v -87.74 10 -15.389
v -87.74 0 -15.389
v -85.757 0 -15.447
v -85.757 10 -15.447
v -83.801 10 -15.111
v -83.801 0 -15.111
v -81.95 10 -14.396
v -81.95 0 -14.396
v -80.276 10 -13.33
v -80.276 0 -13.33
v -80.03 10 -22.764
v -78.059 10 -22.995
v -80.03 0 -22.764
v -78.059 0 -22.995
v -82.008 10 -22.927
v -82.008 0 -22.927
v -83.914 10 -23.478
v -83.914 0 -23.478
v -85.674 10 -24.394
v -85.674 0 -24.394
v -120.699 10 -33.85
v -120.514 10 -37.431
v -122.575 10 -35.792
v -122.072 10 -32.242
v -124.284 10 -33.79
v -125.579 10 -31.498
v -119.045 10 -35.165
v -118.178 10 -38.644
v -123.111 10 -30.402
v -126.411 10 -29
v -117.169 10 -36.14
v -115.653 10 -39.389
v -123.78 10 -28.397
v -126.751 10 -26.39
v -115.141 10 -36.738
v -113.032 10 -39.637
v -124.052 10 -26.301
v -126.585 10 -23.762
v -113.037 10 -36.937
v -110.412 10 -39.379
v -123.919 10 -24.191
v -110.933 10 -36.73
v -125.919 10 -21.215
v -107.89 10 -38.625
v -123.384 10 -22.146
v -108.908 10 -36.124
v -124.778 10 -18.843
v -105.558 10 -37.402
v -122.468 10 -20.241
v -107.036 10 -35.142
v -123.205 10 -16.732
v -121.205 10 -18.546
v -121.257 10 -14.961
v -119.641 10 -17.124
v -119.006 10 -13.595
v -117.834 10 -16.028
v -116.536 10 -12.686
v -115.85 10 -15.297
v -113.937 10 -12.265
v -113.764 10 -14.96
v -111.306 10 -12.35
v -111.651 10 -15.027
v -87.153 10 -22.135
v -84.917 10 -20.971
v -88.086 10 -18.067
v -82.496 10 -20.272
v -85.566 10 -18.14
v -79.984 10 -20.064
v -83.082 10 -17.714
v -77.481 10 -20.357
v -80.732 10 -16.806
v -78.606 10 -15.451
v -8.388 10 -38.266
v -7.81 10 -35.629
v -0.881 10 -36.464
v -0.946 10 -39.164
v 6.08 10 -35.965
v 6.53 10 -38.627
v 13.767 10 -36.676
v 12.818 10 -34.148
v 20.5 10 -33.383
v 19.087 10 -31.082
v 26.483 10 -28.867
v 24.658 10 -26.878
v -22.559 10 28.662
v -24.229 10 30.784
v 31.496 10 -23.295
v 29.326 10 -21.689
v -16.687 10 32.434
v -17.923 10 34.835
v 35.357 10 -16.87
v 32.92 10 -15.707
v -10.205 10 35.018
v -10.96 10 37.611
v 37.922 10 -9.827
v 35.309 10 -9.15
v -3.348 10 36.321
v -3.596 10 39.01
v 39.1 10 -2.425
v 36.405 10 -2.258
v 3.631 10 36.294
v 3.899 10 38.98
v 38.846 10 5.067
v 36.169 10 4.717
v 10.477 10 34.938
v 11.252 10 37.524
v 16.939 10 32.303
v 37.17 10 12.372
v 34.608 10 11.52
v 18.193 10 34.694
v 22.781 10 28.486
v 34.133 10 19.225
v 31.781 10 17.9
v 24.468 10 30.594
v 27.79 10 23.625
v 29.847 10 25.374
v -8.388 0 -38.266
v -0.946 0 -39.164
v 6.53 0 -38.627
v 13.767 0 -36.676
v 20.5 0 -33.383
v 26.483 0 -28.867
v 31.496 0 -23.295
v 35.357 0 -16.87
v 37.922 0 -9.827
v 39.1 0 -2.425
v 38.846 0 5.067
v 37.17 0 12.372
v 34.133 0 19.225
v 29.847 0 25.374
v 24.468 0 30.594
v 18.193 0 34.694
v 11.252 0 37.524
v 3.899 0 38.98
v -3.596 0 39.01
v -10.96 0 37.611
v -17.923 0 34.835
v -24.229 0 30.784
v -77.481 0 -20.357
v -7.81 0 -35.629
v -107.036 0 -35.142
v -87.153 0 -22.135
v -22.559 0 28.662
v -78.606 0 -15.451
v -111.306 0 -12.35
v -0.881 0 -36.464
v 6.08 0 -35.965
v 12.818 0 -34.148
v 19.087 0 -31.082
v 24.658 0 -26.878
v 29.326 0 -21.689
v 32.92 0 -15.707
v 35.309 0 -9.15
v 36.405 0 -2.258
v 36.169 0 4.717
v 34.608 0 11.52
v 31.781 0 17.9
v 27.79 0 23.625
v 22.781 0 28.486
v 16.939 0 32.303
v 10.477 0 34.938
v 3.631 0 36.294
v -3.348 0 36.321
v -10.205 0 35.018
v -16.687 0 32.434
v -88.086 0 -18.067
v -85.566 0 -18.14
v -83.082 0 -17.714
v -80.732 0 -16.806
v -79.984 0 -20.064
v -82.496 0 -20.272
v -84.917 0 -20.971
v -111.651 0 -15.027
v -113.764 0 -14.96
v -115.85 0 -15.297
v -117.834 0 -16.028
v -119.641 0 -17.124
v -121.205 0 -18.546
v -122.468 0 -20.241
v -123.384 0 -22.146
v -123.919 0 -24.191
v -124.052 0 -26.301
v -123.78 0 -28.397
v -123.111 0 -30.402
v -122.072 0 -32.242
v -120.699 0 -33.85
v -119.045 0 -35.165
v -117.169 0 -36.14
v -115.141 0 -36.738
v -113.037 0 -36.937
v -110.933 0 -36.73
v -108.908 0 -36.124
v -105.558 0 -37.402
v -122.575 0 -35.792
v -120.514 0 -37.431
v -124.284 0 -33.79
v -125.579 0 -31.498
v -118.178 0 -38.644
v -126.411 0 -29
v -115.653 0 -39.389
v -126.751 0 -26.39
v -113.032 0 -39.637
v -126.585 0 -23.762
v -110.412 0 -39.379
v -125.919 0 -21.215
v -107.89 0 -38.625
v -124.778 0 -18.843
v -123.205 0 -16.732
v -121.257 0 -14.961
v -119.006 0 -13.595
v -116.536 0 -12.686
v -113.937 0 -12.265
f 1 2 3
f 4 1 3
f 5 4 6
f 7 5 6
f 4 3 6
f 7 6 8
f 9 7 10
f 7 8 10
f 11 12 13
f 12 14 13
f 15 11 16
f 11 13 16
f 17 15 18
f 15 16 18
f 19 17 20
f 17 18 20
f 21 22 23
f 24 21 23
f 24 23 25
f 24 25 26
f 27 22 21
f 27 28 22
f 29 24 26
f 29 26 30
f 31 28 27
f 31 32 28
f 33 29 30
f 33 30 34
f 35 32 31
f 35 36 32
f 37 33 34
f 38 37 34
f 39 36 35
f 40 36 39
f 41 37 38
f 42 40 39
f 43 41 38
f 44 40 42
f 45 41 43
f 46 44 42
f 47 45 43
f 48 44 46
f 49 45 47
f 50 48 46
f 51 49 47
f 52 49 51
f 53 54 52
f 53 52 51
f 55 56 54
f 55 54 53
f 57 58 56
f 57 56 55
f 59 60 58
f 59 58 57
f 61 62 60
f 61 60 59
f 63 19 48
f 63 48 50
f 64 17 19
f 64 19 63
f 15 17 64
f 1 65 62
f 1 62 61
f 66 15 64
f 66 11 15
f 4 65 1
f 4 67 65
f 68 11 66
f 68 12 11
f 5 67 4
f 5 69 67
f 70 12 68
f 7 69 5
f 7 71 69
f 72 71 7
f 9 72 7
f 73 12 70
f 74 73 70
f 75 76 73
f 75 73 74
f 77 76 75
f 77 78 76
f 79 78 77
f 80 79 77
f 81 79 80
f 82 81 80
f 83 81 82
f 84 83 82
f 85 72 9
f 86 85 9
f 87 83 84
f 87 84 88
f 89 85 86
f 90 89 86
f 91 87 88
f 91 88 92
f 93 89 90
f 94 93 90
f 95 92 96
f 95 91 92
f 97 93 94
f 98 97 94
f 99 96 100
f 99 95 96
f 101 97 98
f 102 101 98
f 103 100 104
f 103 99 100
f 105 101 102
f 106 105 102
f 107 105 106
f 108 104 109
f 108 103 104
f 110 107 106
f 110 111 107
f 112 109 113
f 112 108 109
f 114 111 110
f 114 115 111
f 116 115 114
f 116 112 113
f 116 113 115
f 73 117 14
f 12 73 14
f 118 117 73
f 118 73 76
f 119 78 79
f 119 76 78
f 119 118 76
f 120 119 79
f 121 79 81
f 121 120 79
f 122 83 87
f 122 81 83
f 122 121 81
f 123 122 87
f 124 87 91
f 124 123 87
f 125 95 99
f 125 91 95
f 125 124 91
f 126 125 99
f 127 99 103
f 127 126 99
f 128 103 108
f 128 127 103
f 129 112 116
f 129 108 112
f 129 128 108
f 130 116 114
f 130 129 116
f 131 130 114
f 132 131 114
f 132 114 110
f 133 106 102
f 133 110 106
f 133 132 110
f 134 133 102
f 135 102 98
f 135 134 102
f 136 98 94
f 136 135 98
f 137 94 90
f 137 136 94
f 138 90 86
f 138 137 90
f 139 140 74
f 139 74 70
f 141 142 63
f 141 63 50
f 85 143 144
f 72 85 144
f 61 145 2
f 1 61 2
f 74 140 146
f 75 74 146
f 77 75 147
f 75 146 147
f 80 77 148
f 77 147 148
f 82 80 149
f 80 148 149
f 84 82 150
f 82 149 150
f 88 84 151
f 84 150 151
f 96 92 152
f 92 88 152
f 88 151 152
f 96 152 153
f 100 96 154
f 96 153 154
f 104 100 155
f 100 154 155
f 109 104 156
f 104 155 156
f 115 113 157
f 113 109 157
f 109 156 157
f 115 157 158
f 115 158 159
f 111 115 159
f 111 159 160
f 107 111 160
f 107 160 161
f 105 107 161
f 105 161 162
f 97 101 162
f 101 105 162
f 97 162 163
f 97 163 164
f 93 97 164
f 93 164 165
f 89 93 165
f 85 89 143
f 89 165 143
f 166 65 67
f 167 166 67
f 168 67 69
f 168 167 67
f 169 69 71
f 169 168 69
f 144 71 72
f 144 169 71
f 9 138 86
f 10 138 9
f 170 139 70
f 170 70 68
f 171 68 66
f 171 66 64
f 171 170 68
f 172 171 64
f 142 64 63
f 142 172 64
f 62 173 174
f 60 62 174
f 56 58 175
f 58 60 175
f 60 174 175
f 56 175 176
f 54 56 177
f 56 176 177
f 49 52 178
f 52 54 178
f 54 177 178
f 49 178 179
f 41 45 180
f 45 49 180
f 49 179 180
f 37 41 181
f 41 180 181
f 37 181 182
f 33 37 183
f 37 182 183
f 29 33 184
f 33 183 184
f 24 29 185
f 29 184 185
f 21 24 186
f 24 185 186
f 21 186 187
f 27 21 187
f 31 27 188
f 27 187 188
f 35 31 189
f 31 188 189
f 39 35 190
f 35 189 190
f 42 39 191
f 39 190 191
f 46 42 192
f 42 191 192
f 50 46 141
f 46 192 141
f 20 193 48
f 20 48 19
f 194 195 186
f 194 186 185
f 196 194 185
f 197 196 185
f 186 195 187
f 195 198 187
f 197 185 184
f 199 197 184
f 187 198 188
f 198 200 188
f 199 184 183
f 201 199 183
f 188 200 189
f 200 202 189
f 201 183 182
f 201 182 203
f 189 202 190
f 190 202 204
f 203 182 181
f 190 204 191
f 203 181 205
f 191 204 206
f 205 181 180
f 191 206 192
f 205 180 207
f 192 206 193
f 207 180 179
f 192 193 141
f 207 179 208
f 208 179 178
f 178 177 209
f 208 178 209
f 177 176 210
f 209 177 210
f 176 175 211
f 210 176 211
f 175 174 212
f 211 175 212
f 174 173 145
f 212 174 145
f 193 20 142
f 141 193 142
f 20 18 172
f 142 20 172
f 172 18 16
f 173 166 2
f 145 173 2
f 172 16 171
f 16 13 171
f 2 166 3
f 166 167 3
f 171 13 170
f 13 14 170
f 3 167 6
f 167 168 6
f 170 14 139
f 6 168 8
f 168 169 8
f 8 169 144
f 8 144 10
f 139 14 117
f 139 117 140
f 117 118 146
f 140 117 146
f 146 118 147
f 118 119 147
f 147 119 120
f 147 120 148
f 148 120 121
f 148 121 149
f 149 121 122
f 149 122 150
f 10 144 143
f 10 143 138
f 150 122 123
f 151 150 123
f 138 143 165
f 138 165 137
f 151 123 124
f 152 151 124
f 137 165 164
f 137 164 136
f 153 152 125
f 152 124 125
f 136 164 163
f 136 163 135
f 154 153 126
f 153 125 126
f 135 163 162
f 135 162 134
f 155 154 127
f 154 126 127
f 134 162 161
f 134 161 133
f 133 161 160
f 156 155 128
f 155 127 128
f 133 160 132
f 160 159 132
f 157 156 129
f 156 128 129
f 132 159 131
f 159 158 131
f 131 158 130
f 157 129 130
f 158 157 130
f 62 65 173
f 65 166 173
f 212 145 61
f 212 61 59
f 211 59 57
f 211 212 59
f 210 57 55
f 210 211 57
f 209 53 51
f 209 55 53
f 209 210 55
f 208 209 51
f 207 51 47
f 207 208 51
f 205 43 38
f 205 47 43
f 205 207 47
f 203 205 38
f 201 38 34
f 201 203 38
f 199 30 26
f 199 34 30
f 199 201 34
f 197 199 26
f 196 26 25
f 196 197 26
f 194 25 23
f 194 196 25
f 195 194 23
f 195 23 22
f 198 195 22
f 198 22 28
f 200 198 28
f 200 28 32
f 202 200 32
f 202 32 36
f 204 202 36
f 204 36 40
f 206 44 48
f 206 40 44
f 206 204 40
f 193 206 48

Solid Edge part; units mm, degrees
sketch "Sketch1" plane through (0, 0, 0) normal (0, -1, 0) x (1, 0, 0)
  arc A0 (-24.229, 30.7837) -> (-8.3881, -38.2664) centre (0, 0) cw
  line L0 (-8.3881, -38.2664) -> (-78.0589, -22.9945)
  arc A1 (-85.6745, -24.3941) -> (-78.0589, -22.9945) centre (-80.2, -32.7626) cw
  line L1 (-105.5582, -37.4017) -> (-85.6745, -24.3941)
  arc A2 (-105.5582, -37.4017) -> (-111.3055, -12.3495) centre (-113.0582, -25.937) cw
  line L2 (-111.3055, -12.3495) -> (-87.7403, -15.3893)
  arc A3 (-87.7403, -15.3893) -> (-80.2761, -13.3295) centre (-86.4609, -5.4715) ccw
  line L3 (-24.229, 30.7837) -> (-80.2761, -13.3295)
  arc A4 (-22.5591, 28.662) -> (-7.81, -35.6291) centre (0, 0) cw
  line L4 (-7.81, -35.6291) -> (-77.4807, -20.3571)
  arc A5 (-77.4807, -20.3571) -> (-87.1526, -22.1347) centre (-80.2, -32.7626) ccw
  line L5 (-87.1526, -22.1347) -> (-107.0363, -35.1422)
  arc A6 (-107.0363, -35.1422) -> (-111.6509, -15.0274) centre (-113.0582, -25.937) cw
  line L6 (-88.0857, -18.0672) -> (-111.6509, -15.0274)
  arc A7 (-78.6062, -15.4512) -> (-88.0857, -18.0672) centre (-86.4609, -5.4715) cw
  line L7 (-22.5591, 28.662) -> (-78.6062, -15.4512)
  dimension "D1" = 72.95
  dimension "D2" = 22
  dimension "D3" = 36.475
  dimension "D4" = 2.7
extrude "Protrusion1" add sketch "Sketch1" against normal blind 10
properties part number "1976-1100-C01" material "Poliuretano"
